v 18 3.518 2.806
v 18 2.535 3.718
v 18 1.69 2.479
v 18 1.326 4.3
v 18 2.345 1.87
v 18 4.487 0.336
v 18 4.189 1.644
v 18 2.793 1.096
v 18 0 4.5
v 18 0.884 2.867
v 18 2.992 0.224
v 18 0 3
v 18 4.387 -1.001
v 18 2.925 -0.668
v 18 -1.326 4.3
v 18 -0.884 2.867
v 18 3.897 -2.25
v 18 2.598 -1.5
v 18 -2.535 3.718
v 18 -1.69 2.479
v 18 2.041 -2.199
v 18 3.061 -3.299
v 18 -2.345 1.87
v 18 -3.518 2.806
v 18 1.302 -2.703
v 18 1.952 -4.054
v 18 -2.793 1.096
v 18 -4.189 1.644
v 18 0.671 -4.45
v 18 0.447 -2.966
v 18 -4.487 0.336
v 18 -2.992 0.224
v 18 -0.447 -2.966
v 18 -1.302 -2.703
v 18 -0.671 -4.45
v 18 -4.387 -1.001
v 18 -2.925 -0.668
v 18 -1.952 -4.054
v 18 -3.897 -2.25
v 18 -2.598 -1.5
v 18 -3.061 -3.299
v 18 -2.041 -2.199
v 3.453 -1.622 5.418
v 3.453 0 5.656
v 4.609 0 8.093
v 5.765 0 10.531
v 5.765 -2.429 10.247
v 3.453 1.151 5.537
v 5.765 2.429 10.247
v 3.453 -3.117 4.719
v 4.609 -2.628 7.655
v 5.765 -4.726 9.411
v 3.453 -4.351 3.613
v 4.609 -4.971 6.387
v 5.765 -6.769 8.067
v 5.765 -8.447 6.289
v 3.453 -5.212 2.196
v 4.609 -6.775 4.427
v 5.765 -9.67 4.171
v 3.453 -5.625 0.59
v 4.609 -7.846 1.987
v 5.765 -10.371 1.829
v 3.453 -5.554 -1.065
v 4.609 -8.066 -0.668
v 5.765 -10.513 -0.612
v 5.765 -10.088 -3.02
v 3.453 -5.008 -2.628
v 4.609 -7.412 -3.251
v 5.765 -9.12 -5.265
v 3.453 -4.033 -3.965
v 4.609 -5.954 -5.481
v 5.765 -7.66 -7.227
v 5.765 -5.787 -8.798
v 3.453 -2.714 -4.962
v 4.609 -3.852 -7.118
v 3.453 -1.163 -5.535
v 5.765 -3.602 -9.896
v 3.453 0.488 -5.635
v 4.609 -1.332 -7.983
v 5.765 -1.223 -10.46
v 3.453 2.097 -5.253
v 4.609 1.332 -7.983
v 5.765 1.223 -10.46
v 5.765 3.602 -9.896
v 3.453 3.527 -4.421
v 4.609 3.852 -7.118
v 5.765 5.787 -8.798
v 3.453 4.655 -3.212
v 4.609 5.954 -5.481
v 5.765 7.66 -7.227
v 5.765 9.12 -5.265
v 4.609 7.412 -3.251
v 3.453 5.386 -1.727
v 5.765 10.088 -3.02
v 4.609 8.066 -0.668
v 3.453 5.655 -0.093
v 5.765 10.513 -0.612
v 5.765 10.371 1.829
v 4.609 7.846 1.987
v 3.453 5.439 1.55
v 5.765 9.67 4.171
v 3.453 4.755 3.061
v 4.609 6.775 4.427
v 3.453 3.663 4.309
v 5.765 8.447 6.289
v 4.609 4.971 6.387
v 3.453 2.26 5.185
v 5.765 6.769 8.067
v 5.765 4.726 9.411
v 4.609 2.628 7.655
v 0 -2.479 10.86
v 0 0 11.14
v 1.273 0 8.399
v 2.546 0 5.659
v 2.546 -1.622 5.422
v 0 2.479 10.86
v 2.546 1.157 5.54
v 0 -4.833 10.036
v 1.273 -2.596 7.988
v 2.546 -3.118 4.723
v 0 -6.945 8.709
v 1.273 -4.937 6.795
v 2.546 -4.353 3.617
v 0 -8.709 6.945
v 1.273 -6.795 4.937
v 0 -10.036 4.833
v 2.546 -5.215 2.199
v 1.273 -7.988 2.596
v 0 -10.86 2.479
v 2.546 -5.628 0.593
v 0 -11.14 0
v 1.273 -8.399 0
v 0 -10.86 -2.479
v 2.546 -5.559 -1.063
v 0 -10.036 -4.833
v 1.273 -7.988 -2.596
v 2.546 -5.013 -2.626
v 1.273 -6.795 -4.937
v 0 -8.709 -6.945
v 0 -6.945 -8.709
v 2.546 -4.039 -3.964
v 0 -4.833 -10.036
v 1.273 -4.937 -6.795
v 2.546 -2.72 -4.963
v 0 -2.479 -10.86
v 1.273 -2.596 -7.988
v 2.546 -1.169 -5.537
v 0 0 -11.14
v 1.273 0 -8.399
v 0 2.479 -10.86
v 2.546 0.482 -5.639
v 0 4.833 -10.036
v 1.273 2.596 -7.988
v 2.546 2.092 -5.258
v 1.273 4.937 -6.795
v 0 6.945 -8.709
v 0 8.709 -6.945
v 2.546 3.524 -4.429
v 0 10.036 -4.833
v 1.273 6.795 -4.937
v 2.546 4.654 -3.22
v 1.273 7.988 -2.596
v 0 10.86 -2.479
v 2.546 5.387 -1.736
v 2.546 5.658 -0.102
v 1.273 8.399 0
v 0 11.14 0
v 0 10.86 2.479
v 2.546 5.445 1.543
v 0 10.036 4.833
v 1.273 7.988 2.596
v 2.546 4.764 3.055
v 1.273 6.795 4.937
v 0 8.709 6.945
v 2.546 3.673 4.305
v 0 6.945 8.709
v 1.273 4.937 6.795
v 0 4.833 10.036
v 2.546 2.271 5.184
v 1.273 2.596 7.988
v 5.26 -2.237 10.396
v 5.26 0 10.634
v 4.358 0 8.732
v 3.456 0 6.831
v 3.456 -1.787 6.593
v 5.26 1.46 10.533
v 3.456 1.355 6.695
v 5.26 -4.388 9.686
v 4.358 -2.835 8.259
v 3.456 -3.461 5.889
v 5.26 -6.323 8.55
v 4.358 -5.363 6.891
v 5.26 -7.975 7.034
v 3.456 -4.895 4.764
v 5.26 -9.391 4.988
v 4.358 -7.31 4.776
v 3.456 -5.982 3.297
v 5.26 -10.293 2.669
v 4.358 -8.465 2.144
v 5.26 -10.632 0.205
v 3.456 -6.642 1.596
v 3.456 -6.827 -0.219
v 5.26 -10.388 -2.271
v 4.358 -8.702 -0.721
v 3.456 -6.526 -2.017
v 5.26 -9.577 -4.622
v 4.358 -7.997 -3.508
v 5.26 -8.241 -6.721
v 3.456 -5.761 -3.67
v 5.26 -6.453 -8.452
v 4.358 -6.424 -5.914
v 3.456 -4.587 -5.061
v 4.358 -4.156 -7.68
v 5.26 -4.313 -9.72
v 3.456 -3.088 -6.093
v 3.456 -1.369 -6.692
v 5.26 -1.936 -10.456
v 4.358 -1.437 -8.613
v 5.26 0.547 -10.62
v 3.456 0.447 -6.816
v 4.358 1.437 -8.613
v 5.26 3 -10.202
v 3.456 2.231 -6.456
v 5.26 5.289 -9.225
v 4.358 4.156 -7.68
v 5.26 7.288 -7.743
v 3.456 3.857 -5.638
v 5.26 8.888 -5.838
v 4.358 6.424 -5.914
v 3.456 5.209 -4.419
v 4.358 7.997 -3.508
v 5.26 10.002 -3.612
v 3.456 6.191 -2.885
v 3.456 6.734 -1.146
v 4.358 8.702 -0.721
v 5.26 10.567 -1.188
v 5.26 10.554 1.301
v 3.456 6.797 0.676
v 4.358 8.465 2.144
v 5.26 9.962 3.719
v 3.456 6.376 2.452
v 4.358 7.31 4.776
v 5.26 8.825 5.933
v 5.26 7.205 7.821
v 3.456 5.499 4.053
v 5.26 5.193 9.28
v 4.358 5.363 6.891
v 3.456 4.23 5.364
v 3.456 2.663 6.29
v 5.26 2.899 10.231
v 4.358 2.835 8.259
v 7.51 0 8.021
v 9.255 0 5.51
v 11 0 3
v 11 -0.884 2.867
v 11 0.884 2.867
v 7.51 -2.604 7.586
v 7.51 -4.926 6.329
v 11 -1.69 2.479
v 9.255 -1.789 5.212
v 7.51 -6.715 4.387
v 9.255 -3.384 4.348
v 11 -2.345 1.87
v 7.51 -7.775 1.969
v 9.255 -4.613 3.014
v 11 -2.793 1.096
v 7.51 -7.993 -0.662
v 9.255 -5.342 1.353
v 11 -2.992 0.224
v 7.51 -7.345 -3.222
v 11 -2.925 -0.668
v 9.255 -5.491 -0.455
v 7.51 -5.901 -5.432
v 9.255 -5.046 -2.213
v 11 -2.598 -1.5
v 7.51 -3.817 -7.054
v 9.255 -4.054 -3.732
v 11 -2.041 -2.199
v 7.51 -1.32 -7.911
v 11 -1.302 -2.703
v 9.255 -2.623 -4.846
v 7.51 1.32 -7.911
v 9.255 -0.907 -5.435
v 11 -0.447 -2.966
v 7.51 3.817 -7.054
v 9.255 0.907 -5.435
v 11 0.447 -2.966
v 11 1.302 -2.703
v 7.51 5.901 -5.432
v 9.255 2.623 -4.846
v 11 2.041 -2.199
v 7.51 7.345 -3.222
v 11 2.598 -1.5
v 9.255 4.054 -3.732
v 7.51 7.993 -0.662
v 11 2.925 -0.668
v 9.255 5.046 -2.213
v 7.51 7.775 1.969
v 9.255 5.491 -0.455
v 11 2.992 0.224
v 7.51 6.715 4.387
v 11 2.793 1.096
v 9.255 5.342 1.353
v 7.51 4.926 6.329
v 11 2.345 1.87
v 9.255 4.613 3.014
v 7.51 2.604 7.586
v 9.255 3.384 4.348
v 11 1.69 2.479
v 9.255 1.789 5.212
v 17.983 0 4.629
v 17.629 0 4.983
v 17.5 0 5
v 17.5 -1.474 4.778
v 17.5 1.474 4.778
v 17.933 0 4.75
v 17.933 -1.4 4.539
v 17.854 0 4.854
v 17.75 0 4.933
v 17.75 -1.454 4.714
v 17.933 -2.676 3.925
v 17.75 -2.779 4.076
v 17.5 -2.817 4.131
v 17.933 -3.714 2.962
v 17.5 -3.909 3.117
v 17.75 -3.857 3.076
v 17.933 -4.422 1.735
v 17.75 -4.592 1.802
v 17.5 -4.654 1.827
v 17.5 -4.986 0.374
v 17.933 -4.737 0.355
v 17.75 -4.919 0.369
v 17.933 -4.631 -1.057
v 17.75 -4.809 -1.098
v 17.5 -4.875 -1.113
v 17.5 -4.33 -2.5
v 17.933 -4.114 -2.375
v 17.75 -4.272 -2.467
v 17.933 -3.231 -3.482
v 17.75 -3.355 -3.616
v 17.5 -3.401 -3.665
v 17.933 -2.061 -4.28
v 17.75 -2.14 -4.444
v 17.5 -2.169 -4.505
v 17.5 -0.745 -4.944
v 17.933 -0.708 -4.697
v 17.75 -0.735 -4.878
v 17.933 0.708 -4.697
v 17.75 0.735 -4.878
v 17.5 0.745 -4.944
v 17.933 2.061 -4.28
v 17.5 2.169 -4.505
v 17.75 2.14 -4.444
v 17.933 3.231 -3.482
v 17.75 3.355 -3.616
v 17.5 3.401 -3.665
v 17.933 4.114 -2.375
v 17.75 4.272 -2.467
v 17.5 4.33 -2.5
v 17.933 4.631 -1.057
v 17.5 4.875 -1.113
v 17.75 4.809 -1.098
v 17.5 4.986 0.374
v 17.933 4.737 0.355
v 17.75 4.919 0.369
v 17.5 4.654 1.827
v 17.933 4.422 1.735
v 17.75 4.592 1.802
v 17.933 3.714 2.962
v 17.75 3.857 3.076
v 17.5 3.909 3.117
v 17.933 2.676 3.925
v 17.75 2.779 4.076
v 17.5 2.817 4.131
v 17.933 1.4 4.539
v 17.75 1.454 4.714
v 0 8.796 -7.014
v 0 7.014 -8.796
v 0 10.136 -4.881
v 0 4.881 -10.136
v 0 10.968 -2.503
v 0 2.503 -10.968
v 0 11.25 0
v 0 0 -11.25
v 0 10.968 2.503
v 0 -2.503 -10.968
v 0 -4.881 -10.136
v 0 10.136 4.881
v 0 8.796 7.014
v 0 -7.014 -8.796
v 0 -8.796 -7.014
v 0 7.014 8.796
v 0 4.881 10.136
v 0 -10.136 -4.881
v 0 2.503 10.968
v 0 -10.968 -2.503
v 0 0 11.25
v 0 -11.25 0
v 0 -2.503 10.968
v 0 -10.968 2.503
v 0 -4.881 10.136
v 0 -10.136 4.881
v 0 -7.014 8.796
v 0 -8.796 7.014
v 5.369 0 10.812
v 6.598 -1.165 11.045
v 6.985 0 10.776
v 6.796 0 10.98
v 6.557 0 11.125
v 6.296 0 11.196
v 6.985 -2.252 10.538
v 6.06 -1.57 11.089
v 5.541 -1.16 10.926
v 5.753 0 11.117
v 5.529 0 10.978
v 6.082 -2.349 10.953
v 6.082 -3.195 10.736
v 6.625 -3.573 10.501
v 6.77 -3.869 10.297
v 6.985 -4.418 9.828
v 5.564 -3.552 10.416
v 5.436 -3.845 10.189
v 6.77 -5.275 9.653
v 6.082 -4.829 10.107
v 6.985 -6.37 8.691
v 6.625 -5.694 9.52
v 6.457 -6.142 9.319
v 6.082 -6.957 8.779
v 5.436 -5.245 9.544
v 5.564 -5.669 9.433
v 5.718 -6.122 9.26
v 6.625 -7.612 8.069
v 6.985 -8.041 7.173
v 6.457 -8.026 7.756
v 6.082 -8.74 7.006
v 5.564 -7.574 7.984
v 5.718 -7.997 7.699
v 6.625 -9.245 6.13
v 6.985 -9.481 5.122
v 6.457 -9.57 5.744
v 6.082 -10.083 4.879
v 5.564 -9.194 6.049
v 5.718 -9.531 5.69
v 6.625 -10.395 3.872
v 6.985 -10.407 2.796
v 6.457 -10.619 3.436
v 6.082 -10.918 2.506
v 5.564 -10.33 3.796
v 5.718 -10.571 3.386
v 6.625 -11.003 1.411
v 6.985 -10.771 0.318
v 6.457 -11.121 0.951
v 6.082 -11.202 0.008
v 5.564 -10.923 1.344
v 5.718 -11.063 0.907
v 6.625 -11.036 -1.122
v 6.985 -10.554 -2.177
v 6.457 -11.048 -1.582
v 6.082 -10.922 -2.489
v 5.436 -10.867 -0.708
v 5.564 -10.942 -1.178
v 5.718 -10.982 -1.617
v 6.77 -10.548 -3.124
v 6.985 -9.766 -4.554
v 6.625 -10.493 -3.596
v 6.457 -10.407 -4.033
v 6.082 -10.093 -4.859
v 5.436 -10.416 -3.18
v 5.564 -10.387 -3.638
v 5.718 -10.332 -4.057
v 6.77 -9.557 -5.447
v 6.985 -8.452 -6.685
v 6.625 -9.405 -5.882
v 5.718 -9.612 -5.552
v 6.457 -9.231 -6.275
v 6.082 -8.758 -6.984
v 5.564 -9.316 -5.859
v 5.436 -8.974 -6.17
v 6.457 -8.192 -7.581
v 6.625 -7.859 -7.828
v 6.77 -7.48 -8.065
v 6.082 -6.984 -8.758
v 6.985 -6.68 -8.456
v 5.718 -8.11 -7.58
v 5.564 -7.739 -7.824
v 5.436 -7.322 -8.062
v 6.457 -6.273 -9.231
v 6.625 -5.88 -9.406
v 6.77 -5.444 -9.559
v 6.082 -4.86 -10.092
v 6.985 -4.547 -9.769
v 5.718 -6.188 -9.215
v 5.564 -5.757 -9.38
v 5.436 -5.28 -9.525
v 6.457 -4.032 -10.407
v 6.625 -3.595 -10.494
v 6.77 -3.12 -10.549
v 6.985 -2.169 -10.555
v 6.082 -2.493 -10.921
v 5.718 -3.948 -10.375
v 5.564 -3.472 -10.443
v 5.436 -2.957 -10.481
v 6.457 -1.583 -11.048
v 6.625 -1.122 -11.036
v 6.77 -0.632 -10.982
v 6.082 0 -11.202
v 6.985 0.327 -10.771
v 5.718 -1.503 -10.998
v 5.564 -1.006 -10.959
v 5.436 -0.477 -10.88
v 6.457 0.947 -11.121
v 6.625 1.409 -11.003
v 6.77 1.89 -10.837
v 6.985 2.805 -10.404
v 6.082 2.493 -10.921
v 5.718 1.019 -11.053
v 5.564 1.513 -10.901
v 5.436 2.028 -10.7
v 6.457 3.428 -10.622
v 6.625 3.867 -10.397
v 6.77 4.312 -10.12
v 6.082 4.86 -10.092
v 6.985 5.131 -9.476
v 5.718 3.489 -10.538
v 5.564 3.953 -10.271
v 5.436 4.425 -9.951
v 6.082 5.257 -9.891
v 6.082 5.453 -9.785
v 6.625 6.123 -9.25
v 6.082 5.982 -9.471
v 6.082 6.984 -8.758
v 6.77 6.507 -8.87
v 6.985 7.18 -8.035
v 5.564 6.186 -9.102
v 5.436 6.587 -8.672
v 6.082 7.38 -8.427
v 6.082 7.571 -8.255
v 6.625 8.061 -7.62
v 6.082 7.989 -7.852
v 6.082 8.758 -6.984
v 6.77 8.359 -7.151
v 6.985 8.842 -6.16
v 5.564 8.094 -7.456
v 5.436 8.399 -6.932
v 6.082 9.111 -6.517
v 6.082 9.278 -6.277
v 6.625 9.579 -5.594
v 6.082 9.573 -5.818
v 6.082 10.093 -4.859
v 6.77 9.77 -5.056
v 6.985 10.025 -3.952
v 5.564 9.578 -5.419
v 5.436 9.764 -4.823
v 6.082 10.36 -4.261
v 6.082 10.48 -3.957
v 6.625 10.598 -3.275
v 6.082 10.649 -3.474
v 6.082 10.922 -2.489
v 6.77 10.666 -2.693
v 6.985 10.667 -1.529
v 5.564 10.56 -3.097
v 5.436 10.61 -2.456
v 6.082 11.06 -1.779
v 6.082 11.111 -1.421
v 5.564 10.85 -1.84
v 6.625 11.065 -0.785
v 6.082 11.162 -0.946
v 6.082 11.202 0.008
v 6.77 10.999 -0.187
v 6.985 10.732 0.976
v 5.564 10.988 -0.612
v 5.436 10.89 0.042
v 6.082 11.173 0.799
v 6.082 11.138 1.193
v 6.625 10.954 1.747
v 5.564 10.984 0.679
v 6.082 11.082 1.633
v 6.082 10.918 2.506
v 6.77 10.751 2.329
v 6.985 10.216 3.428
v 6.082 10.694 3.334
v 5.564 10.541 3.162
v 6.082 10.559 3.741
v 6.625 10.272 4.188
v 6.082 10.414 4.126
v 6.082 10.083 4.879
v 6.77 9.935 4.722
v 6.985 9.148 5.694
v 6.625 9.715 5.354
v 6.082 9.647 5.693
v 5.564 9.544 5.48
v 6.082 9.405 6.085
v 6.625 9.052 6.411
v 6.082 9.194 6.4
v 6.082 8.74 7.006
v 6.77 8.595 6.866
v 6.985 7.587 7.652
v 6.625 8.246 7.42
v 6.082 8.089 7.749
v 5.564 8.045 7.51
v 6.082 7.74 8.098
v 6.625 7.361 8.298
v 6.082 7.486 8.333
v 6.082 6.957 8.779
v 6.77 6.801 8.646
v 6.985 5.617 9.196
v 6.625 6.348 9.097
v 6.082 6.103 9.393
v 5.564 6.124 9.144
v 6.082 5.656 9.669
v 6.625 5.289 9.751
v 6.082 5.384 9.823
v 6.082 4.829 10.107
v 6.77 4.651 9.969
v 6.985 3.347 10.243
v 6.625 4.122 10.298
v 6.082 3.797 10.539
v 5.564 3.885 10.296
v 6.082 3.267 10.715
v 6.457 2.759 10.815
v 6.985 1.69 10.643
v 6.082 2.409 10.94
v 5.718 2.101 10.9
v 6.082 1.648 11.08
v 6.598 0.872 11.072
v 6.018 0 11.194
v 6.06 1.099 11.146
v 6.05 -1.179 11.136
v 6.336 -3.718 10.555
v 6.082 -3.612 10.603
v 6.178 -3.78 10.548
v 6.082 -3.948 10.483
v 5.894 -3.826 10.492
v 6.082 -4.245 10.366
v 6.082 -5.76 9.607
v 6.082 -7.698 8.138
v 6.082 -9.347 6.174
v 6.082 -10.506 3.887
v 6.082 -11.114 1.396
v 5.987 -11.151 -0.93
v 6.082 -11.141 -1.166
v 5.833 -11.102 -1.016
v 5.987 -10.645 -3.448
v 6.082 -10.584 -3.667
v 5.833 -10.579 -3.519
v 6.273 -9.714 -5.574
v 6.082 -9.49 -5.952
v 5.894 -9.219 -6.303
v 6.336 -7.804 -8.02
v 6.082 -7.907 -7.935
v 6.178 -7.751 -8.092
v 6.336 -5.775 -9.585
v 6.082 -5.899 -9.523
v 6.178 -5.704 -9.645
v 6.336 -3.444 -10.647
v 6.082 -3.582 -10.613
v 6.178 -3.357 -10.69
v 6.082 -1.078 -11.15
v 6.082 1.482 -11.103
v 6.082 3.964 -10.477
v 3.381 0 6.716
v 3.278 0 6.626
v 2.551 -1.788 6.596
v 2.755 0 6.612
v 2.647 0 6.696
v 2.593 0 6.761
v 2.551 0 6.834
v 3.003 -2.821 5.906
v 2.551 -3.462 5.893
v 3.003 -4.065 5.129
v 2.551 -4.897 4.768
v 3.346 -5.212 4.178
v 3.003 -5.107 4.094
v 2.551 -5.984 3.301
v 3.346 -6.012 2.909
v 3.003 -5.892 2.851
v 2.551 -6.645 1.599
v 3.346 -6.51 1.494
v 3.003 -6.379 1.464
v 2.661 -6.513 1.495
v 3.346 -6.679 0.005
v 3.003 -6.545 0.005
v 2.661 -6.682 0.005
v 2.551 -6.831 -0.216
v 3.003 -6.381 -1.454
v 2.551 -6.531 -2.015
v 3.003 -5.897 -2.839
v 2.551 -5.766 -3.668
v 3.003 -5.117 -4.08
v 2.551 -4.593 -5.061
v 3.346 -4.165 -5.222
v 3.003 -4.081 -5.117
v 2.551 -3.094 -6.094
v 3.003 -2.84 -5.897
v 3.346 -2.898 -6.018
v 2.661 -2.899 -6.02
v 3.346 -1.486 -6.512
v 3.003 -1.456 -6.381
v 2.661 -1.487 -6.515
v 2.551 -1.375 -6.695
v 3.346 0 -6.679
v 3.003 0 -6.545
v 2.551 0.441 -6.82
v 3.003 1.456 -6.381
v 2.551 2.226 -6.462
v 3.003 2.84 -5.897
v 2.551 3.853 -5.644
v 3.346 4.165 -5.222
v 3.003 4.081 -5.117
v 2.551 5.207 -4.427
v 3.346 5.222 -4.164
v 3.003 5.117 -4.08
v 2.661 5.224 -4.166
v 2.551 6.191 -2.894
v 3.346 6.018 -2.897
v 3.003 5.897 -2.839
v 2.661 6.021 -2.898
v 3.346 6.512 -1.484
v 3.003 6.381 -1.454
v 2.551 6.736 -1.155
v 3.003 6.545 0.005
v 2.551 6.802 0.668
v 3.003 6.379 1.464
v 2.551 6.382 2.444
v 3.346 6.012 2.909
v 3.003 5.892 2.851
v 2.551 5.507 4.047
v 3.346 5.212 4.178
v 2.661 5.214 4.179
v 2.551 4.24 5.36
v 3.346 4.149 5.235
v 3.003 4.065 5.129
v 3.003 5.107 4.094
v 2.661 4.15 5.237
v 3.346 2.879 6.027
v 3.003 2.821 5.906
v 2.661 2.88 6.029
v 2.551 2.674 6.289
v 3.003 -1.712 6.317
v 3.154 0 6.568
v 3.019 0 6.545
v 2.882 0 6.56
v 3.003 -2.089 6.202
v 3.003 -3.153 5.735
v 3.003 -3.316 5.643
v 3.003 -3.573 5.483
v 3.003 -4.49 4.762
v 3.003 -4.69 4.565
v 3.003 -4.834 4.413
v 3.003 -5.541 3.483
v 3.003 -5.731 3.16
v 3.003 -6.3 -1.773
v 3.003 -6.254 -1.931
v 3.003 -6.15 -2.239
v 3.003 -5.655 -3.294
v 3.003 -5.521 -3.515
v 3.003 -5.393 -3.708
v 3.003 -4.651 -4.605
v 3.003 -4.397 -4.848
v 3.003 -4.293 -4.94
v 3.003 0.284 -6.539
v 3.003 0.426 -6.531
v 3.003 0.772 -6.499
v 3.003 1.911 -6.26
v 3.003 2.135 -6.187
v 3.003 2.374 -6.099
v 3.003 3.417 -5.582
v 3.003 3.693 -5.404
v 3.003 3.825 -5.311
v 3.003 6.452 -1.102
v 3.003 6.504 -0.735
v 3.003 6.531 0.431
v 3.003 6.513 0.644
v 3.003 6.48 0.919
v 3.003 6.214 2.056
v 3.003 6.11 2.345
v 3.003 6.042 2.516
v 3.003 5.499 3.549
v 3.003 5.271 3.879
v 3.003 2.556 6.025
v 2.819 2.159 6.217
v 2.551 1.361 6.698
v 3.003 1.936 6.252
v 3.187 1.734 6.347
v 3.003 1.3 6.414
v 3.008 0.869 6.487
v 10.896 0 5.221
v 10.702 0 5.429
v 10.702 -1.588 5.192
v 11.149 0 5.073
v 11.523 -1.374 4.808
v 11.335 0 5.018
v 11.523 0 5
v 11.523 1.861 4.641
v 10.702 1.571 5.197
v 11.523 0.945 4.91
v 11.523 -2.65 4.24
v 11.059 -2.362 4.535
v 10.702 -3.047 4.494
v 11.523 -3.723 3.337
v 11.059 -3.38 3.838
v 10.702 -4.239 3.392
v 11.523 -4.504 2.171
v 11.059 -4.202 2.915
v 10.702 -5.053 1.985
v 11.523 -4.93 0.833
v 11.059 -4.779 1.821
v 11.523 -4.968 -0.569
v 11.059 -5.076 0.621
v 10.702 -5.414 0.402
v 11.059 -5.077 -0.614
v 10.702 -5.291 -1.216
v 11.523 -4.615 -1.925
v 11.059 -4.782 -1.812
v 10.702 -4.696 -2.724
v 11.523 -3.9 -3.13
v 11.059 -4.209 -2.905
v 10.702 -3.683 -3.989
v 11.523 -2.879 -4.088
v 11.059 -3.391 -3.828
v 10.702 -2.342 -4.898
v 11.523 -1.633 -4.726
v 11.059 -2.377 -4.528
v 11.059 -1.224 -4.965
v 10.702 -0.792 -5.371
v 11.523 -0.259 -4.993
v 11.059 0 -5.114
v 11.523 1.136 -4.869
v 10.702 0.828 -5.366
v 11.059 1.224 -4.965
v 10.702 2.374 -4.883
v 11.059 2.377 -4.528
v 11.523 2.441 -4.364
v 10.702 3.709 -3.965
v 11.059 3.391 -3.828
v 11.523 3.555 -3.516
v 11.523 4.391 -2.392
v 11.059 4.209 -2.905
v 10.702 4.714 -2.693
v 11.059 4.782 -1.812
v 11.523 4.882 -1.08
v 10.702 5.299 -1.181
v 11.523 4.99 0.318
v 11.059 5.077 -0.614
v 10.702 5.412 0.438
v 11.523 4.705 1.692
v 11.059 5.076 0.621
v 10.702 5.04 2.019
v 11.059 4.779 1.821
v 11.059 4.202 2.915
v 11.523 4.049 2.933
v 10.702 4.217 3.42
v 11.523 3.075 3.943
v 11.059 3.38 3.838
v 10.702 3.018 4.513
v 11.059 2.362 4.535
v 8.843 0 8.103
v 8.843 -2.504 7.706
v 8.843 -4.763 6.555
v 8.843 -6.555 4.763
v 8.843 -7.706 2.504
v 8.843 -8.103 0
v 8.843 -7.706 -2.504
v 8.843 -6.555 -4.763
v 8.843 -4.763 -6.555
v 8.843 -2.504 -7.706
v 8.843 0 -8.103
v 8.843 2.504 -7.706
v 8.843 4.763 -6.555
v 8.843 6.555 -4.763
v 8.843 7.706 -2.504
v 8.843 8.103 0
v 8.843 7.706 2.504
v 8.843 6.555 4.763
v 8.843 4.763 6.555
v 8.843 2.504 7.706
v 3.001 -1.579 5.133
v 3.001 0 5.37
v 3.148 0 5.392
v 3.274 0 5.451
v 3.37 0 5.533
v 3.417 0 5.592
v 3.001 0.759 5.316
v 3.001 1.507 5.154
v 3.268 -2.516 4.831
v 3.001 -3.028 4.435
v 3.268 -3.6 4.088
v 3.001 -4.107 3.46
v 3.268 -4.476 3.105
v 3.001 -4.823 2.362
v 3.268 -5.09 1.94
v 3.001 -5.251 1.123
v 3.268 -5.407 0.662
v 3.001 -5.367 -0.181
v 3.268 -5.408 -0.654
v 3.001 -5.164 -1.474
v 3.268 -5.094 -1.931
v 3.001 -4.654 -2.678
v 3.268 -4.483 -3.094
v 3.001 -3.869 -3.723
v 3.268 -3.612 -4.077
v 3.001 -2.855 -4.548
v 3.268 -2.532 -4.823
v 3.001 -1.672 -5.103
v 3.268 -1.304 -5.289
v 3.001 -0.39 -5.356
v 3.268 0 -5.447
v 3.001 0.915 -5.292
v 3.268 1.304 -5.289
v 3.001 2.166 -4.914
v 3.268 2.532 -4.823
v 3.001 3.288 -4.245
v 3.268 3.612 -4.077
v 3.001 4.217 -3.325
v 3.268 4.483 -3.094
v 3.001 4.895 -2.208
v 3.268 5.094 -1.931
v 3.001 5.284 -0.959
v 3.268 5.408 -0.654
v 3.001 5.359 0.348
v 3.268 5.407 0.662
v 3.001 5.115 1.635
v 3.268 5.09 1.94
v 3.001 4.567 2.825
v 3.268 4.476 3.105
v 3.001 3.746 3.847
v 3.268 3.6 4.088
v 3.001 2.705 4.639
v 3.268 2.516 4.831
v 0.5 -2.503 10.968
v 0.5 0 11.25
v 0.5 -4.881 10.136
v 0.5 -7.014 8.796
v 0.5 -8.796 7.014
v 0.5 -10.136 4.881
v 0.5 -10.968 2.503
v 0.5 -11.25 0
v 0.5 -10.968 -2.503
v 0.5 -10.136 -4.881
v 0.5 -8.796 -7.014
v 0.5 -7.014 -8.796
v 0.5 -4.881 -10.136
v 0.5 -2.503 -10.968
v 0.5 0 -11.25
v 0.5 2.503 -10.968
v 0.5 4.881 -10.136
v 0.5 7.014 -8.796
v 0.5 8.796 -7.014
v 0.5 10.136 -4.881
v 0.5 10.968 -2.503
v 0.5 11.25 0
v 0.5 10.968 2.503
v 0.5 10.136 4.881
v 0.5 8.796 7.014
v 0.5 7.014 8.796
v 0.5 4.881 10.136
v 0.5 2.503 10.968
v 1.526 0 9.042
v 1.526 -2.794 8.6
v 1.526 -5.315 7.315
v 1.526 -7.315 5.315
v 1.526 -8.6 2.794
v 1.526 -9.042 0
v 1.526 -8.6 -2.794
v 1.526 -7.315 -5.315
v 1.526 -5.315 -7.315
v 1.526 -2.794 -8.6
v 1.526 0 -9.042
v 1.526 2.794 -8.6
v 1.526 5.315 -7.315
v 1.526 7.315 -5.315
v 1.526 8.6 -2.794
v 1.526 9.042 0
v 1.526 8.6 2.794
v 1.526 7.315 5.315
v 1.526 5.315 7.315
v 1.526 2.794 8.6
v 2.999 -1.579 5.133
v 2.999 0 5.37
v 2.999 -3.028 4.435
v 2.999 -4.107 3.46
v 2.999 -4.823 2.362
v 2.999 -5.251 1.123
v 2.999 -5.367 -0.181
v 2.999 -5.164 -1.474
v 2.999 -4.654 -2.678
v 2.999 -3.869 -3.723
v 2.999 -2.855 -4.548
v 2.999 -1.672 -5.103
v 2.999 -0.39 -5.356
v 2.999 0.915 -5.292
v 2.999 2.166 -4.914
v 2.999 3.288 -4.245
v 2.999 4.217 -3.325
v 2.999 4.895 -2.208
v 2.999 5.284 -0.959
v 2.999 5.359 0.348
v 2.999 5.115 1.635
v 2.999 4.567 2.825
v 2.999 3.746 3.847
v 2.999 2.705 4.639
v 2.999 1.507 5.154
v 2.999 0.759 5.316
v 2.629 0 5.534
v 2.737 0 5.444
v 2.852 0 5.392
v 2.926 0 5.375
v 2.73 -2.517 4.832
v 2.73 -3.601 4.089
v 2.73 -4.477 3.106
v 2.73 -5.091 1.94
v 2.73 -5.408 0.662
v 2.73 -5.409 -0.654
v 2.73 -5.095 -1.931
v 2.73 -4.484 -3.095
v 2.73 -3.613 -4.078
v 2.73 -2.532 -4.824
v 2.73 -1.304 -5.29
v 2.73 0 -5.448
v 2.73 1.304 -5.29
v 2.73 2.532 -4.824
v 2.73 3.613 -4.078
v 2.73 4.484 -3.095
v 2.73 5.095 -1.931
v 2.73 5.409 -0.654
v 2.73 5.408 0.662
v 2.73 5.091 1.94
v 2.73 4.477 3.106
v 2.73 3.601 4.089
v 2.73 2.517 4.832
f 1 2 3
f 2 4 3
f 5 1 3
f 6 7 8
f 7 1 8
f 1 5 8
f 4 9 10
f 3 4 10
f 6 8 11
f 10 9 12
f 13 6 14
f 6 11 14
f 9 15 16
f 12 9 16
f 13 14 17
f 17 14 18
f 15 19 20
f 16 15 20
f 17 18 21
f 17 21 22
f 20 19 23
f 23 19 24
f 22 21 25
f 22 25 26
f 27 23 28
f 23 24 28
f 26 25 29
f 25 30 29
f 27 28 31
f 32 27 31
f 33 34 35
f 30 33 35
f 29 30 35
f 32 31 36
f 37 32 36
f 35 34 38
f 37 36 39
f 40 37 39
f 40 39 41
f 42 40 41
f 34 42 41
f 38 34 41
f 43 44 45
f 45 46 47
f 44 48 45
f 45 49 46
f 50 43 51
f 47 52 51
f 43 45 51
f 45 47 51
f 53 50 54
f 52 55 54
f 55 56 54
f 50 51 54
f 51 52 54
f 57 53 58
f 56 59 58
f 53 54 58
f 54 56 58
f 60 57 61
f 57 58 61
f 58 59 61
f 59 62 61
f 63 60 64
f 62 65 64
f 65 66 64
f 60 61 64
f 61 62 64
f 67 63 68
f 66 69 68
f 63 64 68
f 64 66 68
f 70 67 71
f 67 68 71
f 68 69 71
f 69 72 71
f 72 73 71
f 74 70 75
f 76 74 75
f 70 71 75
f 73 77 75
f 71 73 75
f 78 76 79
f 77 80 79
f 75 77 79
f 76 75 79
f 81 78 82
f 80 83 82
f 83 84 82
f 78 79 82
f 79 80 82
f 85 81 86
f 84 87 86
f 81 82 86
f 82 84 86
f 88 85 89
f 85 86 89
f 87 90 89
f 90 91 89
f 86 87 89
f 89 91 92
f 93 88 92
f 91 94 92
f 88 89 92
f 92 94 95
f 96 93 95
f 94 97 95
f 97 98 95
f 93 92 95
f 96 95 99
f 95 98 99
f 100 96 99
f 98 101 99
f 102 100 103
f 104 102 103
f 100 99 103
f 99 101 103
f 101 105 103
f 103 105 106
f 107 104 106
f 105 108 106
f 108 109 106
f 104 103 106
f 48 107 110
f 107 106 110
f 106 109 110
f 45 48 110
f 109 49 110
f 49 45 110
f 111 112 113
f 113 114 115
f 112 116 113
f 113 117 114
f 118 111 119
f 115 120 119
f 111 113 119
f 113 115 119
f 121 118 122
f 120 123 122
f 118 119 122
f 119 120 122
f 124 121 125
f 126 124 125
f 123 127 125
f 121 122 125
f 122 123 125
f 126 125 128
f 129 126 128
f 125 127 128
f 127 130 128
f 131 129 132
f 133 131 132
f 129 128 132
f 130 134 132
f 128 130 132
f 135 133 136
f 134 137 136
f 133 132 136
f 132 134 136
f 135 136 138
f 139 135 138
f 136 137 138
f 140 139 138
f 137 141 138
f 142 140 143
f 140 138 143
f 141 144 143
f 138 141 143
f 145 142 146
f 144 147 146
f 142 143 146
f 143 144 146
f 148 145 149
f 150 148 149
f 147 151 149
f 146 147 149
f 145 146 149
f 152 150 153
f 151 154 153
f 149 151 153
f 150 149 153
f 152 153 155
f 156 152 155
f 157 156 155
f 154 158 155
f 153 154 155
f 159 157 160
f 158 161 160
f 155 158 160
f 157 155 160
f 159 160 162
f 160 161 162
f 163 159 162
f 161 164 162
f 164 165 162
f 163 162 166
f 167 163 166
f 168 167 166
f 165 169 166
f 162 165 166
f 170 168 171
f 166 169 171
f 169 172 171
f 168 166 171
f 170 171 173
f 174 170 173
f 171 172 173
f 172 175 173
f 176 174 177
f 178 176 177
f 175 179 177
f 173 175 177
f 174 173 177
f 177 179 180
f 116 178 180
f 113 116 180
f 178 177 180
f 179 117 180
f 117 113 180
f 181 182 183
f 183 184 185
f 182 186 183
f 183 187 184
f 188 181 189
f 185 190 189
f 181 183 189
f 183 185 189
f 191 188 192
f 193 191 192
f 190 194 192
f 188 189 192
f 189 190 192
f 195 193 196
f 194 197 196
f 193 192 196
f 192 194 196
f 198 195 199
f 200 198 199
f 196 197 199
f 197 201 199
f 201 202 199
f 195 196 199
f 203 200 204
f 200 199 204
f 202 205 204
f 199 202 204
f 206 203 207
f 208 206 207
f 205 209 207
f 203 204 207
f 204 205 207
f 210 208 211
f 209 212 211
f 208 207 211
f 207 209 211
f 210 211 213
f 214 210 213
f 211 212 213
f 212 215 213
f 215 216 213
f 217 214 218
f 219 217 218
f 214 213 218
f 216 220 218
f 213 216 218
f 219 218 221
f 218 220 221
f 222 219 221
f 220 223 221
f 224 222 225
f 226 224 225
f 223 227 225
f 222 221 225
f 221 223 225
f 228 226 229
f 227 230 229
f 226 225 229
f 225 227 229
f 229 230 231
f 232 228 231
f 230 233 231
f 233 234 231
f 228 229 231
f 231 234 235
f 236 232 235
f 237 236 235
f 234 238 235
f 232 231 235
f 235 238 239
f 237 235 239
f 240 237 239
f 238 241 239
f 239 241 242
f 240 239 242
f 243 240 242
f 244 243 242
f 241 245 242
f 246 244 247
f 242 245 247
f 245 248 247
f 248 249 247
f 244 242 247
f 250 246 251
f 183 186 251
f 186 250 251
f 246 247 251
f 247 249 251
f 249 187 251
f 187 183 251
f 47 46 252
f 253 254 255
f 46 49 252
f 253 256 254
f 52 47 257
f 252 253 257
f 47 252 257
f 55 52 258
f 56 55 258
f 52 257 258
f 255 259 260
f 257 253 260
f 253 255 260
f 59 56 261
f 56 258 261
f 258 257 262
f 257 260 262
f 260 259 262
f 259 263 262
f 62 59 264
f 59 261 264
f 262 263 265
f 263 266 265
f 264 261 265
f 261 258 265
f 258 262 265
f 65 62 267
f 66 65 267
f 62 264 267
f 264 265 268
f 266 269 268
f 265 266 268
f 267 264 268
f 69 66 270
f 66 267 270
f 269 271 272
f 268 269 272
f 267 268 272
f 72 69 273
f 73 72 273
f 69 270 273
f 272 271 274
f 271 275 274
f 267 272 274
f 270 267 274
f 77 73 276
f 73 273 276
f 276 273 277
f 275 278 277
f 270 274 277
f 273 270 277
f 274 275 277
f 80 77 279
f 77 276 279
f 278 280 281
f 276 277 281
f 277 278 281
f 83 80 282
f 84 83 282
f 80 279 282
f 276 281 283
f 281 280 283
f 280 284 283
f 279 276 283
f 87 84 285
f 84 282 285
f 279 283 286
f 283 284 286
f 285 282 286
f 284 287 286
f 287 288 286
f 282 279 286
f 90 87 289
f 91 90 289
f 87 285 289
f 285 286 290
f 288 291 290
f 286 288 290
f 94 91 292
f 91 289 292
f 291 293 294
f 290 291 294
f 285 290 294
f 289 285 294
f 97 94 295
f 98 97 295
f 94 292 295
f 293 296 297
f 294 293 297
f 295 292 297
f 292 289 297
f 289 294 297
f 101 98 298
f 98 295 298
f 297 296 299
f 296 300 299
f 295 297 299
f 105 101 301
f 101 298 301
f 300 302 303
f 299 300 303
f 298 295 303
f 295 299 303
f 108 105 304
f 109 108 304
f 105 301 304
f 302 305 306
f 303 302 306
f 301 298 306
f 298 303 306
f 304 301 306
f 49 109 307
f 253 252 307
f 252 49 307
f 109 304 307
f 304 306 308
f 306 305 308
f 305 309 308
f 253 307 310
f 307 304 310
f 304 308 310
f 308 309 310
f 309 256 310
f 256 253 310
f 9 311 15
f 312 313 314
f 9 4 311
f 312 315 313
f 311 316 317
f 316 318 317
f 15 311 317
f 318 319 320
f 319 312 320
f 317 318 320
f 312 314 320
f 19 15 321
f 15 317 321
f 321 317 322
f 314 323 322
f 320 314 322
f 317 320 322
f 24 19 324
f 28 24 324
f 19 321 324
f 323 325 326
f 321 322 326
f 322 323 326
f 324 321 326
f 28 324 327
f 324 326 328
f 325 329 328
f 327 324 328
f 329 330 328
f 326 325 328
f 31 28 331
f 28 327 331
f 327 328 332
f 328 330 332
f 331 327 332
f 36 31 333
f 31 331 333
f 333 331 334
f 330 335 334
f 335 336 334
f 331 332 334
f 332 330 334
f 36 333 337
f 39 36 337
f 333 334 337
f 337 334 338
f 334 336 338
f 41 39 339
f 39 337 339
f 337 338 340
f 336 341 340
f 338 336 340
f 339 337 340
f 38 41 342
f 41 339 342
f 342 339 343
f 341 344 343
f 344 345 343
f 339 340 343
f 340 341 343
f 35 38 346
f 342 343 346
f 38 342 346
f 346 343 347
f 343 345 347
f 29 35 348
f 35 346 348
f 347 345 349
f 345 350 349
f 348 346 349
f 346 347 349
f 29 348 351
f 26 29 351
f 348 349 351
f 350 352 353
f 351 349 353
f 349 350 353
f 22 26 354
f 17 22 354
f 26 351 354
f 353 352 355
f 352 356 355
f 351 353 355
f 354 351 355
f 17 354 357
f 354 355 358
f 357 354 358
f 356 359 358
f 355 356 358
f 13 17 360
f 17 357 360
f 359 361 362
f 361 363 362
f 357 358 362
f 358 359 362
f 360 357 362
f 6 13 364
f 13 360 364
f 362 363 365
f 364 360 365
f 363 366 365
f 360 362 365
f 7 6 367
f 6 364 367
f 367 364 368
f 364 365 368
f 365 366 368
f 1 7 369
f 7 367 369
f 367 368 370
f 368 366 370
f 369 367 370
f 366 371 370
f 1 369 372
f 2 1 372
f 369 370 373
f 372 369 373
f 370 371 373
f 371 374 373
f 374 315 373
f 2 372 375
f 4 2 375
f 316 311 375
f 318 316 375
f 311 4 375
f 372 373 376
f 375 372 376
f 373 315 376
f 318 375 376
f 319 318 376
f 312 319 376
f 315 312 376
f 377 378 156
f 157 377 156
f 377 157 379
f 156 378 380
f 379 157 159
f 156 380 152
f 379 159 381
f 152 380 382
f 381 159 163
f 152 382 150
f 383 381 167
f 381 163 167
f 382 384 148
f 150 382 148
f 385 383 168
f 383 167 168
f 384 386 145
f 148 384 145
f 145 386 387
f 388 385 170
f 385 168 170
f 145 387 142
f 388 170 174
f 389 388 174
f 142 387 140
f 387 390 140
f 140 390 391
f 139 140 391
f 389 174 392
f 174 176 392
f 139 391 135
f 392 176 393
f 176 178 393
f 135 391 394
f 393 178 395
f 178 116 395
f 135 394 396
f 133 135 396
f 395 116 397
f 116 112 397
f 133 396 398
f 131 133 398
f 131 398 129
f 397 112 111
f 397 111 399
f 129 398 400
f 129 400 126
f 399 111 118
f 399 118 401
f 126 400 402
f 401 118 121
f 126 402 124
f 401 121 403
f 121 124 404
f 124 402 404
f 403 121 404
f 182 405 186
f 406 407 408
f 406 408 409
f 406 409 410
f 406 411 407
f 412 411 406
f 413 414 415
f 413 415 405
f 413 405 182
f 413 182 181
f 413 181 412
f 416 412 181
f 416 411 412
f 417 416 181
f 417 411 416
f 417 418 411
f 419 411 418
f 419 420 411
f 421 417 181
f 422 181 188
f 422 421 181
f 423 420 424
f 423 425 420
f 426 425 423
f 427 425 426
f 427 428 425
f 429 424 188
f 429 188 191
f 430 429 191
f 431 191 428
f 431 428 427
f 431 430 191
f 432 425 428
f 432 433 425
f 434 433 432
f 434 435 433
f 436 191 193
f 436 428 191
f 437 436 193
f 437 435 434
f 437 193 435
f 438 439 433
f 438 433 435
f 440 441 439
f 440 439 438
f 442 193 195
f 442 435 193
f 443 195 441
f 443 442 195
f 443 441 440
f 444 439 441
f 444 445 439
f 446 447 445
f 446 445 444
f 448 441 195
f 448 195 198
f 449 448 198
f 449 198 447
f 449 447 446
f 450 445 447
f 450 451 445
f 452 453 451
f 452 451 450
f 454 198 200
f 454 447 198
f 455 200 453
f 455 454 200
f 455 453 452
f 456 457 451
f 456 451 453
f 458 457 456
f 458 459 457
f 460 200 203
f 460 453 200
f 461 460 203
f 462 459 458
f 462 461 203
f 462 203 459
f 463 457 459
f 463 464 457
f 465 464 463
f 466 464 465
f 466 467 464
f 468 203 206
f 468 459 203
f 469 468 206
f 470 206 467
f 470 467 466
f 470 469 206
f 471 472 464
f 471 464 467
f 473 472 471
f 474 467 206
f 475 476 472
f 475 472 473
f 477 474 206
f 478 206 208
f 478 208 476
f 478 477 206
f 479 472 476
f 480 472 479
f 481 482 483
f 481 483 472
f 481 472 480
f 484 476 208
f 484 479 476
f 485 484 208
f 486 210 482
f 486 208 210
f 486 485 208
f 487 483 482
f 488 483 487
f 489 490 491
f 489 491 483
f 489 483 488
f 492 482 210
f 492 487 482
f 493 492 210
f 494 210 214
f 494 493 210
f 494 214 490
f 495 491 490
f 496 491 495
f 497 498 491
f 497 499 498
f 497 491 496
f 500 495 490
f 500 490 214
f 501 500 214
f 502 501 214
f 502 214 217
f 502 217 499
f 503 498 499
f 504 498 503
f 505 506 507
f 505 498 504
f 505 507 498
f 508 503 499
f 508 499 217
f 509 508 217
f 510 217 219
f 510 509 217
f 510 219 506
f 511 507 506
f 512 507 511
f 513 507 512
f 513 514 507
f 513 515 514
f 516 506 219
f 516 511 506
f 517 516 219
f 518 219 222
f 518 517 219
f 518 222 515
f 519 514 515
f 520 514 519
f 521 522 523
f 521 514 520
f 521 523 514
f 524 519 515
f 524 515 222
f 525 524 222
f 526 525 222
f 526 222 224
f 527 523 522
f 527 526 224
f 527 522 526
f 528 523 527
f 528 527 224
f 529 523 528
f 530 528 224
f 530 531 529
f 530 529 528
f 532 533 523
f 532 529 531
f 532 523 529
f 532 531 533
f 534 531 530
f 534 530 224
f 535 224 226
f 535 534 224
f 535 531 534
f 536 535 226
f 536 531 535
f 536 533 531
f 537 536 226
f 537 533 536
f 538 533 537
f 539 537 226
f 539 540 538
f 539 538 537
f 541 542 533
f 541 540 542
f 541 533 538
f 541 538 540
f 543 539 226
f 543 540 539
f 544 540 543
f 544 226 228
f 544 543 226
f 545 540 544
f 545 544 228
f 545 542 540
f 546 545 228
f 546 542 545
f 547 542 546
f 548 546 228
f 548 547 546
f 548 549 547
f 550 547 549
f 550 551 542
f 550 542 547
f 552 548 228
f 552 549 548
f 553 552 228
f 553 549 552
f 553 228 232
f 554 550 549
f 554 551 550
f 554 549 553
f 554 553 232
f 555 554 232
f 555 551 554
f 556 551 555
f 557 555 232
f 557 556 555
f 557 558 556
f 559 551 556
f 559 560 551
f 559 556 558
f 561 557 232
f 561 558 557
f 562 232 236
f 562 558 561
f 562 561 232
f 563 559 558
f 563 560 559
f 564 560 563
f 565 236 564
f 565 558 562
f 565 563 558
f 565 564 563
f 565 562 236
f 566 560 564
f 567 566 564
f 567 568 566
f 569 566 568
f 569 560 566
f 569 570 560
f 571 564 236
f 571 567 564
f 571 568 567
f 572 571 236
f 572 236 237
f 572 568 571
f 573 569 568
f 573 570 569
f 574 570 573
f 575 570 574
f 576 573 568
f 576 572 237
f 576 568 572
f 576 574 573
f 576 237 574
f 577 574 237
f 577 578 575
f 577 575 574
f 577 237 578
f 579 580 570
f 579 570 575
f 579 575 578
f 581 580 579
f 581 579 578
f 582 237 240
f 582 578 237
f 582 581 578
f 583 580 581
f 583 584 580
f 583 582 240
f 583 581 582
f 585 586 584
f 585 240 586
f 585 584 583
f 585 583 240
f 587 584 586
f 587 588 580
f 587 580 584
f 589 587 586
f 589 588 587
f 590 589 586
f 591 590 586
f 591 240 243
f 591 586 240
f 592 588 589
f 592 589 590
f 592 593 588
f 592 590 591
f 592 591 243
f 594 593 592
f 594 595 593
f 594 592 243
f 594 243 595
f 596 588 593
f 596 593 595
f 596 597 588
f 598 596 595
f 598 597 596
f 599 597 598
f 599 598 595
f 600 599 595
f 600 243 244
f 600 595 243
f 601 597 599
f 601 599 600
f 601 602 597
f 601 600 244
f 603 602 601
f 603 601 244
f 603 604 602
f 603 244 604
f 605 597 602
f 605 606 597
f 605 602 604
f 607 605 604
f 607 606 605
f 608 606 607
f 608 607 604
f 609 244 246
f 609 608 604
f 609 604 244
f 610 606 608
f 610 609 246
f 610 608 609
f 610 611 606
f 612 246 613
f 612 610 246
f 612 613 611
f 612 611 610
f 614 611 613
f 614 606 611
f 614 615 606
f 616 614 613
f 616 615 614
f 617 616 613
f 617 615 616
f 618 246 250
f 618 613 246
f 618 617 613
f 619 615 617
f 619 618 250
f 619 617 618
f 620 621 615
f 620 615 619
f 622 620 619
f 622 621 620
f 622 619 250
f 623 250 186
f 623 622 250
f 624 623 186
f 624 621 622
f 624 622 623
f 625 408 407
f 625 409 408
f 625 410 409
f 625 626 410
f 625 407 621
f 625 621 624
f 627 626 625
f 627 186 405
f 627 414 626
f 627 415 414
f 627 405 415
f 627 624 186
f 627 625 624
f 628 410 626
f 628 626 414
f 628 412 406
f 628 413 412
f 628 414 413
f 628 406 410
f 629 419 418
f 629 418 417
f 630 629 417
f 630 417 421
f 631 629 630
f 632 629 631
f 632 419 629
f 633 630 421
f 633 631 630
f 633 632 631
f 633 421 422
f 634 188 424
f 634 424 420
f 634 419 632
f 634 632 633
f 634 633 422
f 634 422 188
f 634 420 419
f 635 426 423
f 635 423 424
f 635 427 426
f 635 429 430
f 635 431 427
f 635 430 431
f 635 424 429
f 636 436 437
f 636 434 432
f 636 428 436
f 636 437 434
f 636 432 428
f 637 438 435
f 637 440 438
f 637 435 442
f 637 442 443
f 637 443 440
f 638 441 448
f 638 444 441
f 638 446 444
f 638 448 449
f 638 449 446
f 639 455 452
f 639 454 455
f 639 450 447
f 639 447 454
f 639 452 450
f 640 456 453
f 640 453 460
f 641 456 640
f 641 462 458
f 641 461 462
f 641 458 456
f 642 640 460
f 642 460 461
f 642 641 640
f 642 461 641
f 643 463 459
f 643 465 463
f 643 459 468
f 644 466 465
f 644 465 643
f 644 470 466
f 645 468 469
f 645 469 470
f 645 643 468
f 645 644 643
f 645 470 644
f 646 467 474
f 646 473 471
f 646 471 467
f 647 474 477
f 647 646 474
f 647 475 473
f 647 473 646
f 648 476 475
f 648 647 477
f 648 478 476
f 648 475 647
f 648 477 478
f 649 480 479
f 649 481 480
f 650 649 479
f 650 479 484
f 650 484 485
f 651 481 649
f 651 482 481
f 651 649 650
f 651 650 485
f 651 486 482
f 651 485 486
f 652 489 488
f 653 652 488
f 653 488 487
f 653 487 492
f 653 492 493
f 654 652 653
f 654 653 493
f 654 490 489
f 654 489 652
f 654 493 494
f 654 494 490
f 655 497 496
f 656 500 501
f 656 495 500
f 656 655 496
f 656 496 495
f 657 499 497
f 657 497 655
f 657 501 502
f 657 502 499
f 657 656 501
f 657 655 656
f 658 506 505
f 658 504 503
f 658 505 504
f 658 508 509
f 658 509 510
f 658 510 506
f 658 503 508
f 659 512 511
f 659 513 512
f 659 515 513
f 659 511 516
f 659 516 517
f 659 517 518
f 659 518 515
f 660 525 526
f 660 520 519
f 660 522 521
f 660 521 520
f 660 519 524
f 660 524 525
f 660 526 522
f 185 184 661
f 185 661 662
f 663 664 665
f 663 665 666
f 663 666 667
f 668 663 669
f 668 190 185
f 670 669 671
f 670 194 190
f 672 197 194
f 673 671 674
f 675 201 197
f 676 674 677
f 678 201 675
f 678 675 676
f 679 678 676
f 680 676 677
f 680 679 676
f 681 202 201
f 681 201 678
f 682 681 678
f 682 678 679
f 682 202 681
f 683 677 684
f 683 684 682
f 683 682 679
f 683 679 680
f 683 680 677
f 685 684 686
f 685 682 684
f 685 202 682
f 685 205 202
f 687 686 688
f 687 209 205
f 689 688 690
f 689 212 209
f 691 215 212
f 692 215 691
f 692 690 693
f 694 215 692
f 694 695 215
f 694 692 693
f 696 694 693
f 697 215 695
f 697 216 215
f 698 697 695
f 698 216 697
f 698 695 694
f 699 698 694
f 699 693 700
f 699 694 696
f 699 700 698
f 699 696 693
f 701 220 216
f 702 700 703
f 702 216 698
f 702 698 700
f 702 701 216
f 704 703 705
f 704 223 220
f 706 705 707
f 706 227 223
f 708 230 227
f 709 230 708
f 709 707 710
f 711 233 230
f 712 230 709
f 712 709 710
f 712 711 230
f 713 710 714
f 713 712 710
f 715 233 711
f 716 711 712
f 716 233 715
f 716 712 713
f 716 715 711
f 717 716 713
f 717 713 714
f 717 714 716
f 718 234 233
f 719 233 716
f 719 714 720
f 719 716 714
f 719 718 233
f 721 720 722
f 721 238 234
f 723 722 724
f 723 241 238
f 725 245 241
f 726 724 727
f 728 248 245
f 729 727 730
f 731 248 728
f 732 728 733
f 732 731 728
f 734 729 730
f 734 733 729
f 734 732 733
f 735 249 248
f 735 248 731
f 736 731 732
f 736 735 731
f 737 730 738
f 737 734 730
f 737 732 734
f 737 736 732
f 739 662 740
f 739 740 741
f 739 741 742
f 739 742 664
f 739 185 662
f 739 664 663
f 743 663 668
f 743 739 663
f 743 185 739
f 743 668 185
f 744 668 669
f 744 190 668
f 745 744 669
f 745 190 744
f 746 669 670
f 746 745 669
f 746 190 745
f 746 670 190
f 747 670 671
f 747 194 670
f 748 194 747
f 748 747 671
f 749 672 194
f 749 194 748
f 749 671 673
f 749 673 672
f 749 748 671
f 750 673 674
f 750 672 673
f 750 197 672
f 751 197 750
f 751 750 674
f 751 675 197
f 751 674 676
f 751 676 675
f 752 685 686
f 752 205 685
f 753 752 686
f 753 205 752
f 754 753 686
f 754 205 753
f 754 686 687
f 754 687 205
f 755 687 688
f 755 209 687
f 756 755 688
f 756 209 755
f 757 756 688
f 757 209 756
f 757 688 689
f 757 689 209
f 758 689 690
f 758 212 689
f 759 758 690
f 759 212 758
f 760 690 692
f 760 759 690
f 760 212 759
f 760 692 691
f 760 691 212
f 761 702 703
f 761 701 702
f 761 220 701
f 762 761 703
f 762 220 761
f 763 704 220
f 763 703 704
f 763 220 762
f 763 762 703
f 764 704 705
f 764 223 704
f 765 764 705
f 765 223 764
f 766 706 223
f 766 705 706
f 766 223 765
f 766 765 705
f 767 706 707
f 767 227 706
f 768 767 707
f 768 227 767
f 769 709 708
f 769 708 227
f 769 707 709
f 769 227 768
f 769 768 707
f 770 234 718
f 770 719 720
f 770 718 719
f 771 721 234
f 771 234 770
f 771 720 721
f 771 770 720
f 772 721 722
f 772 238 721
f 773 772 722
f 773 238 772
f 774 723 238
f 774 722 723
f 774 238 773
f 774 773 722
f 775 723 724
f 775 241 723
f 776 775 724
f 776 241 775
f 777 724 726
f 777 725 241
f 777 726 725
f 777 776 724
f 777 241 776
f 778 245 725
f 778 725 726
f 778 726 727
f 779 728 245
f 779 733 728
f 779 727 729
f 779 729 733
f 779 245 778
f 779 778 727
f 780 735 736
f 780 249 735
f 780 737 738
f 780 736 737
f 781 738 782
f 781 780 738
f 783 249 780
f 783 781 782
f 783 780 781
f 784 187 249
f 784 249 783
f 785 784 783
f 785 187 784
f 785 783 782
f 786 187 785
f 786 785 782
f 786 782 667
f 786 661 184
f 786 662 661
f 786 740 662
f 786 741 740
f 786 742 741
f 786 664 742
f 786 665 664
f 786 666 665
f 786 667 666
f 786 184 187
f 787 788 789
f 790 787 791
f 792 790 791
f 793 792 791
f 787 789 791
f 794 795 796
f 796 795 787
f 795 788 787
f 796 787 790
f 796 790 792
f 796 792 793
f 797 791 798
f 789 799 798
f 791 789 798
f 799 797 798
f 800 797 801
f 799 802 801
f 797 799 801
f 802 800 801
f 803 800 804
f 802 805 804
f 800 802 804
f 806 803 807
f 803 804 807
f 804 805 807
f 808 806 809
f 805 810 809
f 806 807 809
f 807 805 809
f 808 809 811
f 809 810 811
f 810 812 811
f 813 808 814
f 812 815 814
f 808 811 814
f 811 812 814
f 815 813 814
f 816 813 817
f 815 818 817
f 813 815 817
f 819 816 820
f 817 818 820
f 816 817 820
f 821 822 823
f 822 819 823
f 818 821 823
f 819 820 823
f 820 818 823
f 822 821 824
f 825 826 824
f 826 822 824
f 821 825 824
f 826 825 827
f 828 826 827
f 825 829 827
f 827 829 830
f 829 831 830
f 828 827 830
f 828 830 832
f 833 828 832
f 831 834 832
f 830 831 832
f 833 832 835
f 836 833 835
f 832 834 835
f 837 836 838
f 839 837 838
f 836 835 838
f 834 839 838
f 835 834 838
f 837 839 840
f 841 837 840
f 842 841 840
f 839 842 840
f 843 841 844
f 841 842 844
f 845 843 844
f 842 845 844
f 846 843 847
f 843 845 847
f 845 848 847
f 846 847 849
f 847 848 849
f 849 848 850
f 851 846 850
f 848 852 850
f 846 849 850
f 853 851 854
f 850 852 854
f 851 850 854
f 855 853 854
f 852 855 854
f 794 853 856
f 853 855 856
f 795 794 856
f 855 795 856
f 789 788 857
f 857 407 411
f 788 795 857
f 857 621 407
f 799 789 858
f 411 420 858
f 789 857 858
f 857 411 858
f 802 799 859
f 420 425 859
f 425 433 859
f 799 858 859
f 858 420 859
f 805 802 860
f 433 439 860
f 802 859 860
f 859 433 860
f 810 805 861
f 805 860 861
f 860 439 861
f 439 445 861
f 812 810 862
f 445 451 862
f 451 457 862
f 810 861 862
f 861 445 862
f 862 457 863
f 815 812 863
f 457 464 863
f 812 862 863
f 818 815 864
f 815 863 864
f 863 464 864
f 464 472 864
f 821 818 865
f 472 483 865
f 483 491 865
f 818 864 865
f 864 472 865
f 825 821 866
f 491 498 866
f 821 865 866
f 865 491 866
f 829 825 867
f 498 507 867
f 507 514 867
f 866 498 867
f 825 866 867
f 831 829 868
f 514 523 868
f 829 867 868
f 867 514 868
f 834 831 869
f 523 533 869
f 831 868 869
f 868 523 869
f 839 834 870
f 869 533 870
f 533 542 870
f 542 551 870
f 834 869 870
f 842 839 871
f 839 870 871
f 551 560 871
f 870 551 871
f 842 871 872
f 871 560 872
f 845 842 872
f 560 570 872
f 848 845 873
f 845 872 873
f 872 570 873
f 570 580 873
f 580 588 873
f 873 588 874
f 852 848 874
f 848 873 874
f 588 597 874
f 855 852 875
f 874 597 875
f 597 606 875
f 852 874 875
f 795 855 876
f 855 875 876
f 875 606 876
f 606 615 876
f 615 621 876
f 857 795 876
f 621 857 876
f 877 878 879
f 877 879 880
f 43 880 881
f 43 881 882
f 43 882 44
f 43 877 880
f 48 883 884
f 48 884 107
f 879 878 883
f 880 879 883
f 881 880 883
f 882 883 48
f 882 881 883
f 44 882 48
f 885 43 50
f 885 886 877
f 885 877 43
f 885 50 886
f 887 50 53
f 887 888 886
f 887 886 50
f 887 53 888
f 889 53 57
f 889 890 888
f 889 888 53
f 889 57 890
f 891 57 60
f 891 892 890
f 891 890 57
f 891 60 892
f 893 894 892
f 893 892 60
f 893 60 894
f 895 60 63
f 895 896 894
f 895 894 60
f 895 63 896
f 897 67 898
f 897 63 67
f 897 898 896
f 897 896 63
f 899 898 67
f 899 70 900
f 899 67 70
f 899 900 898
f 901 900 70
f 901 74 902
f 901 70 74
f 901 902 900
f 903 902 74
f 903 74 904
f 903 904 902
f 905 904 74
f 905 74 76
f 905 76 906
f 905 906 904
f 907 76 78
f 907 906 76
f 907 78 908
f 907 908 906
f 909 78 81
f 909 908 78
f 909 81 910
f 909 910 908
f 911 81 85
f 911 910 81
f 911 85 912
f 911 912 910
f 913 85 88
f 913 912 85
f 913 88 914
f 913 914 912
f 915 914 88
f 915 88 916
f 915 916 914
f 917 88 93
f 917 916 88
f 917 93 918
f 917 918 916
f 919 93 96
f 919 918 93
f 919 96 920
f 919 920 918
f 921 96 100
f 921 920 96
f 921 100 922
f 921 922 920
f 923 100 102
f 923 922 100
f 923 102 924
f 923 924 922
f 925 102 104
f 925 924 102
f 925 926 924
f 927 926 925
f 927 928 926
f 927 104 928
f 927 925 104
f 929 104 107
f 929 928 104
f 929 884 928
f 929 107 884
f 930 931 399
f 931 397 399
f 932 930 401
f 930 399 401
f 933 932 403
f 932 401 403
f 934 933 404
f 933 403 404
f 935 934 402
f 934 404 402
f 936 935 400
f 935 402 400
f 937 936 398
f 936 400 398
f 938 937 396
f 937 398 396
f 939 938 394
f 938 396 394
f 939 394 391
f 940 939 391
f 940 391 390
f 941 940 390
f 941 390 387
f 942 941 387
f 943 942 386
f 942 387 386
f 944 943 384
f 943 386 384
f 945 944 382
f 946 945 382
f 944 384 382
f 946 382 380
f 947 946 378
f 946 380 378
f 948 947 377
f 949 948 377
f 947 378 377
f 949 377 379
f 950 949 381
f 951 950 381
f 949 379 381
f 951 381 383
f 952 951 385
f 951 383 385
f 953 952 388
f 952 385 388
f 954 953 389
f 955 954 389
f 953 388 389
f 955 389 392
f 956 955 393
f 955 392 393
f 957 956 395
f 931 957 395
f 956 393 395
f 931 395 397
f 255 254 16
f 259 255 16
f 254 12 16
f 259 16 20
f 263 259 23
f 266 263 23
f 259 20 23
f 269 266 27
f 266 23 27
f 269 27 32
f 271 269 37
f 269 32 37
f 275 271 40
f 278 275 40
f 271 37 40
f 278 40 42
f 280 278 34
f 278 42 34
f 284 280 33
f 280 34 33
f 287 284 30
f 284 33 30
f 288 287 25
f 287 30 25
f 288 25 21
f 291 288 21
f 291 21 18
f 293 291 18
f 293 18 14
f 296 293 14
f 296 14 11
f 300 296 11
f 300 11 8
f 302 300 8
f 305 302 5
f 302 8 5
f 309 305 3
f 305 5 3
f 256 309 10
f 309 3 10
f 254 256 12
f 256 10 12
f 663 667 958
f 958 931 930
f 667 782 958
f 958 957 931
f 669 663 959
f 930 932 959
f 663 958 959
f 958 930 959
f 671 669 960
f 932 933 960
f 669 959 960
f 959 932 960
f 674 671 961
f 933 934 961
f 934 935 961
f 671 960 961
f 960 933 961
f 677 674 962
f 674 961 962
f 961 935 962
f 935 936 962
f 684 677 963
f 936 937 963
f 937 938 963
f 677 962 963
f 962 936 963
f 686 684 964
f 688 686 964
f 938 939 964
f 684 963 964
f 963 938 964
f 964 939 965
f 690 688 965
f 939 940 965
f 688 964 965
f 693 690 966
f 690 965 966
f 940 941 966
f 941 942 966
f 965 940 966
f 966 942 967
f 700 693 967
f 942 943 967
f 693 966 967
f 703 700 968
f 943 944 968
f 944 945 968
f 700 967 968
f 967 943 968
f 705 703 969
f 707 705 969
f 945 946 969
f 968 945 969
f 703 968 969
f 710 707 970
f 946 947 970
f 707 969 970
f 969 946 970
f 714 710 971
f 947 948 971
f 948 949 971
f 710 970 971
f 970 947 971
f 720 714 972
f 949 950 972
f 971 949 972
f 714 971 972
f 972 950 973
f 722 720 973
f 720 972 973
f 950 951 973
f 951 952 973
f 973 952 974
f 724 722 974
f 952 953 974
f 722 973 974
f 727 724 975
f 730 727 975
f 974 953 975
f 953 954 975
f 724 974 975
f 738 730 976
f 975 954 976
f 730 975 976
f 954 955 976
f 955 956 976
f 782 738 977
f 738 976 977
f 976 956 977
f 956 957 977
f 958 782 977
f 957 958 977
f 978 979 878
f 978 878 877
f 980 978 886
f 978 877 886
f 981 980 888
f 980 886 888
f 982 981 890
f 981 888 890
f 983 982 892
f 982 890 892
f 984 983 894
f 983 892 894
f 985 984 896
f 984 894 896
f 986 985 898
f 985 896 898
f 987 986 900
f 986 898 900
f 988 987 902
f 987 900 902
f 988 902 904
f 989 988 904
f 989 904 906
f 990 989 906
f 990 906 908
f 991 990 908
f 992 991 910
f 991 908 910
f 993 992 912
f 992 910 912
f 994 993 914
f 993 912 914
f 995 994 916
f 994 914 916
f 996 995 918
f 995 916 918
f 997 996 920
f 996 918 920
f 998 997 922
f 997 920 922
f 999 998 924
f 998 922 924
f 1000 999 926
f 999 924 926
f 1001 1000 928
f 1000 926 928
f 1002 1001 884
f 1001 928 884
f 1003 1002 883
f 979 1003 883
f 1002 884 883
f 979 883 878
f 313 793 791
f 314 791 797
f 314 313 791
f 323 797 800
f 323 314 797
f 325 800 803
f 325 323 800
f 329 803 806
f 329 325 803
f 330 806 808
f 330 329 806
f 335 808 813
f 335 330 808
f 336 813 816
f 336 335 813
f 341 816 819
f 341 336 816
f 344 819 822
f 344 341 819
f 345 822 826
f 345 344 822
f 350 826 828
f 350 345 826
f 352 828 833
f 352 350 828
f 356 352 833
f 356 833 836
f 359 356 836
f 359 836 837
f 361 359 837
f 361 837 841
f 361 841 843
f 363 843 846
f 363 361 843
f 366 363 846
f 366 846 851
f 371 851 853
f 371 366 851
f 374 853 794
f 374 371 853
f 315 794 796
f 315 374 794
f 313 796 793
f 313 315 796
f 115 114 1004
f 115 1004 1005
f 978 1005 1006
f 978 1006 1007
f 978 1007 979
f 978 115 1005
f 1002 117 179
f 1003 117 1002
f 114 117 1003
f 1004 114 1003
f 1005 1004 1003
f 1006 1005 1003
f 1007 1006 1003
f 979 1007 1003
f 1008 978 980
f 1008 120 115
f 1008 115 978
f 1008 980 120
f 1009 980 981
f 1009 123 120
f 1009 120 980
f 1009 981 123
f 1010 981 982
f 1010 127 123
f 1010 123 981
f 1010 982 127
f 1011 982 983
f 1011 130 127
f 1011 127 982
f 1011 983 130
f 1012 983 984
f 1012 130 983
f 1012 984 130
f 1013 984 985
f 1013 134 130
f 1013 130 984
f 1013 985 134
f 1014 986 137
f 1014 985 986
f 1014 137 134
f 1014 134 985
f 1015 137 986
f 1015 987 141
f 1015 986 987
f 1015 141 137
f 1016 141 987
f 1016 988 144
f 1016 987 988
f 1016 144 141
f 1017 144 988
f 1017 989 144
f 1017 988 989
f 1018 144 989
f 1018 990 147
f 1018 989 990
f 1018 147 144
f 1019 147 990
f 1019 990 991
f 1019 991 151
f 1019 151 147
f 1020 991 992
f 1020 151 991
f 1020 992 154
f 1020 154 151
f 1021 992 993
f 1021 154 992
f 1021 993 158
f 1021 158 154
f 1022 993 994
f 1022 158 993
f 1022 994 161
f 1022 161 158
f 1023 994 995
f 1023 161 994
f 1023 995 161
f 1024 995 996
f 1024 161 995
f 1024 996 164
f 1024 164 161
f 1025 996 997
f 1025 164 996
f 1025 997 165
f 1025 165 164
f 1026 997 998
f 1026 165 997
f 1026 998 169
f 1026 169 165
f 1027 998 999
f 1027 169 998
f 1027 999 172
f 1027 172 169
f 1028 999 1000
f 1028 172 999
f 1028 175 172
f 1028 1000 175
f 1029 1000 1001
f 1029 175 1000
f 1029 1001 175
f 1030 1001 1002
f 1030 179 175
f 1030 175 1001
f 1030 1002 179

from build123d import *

# Parameters (mm, degrees)
SKETCH_1_W = 7
SKETCH_1_H = 2
FILLET_1_R = 1
FILLET_2_R = 1
FILLET_3_R = 0.5
FILLET_4_R = 0.5
FILLET_5_R = 0.5


with BuildPart() as part:
    # Эскиз1 → Повернуть1 (revolve)
    with BuildSketch(Plane.XY, mode=Mode.PRIVATE) as revolve_1_sk:
        Polygon((0, 11.25), (0, 11.13953373), (2.680178173, 5.37), (3.317019891, 5.37), (5.765043922, 10.530887802), (11, 3), (11, 5), (6, 12.192885374), (3, 5.868330053), (0.5, 11.25), align=None)
        with Locations((14.5, 4)):
            Rectangle(SKETCH_1_W, SKETCH_1_H)
    revolve(revolve_1_sk.sketch.rotate(Axis((0, 0, 0), (1, 0, 0)), 90), axis=Axis((0, 0, 0), (1, 0, 0)))

    # Скругление1
    fillet_1_edges = [part.edges().sort_by_distance(p)[0] for p in [
        (6, 0, -12.192885374),
    ]]
    fillet(fillet_1_edges, radius=FILLET_1_R)

    # Скругление2
    fillet_2_edges = [part.edges().sort_by_distance(p)[0] for p in [
        (11, 0, -5),
    ]]
    fillet(fillet_2_edges, radius=FILLET_2_R)

    # Скругление3
    fillet_3_edges = [part.edges().sort_by_distance(p)[0] for p in [
        (3, 0, -5.868330053),
    ]]
    fillet(fillet_3_edges, radius=FILLET_3_R)

    # Скругление4
    fillet_4_edges = [part.edges().sort_by_distance(p)[0] for p in [
        (3.317019891, 0, -5.37),
        (2.680178173, 0, -5.37),
    ]]
    fillet(fillet_4_edges, radius=FILLET_4_R)

    # Скругление5
    fillet_5_edges = [part.edges().sort_by_distance(p)[0] for p in [
        (18, 0, -5),
    ]]
    fillet(fillet_5_edges, radius=FILLET_5_R)


solid = part.part
